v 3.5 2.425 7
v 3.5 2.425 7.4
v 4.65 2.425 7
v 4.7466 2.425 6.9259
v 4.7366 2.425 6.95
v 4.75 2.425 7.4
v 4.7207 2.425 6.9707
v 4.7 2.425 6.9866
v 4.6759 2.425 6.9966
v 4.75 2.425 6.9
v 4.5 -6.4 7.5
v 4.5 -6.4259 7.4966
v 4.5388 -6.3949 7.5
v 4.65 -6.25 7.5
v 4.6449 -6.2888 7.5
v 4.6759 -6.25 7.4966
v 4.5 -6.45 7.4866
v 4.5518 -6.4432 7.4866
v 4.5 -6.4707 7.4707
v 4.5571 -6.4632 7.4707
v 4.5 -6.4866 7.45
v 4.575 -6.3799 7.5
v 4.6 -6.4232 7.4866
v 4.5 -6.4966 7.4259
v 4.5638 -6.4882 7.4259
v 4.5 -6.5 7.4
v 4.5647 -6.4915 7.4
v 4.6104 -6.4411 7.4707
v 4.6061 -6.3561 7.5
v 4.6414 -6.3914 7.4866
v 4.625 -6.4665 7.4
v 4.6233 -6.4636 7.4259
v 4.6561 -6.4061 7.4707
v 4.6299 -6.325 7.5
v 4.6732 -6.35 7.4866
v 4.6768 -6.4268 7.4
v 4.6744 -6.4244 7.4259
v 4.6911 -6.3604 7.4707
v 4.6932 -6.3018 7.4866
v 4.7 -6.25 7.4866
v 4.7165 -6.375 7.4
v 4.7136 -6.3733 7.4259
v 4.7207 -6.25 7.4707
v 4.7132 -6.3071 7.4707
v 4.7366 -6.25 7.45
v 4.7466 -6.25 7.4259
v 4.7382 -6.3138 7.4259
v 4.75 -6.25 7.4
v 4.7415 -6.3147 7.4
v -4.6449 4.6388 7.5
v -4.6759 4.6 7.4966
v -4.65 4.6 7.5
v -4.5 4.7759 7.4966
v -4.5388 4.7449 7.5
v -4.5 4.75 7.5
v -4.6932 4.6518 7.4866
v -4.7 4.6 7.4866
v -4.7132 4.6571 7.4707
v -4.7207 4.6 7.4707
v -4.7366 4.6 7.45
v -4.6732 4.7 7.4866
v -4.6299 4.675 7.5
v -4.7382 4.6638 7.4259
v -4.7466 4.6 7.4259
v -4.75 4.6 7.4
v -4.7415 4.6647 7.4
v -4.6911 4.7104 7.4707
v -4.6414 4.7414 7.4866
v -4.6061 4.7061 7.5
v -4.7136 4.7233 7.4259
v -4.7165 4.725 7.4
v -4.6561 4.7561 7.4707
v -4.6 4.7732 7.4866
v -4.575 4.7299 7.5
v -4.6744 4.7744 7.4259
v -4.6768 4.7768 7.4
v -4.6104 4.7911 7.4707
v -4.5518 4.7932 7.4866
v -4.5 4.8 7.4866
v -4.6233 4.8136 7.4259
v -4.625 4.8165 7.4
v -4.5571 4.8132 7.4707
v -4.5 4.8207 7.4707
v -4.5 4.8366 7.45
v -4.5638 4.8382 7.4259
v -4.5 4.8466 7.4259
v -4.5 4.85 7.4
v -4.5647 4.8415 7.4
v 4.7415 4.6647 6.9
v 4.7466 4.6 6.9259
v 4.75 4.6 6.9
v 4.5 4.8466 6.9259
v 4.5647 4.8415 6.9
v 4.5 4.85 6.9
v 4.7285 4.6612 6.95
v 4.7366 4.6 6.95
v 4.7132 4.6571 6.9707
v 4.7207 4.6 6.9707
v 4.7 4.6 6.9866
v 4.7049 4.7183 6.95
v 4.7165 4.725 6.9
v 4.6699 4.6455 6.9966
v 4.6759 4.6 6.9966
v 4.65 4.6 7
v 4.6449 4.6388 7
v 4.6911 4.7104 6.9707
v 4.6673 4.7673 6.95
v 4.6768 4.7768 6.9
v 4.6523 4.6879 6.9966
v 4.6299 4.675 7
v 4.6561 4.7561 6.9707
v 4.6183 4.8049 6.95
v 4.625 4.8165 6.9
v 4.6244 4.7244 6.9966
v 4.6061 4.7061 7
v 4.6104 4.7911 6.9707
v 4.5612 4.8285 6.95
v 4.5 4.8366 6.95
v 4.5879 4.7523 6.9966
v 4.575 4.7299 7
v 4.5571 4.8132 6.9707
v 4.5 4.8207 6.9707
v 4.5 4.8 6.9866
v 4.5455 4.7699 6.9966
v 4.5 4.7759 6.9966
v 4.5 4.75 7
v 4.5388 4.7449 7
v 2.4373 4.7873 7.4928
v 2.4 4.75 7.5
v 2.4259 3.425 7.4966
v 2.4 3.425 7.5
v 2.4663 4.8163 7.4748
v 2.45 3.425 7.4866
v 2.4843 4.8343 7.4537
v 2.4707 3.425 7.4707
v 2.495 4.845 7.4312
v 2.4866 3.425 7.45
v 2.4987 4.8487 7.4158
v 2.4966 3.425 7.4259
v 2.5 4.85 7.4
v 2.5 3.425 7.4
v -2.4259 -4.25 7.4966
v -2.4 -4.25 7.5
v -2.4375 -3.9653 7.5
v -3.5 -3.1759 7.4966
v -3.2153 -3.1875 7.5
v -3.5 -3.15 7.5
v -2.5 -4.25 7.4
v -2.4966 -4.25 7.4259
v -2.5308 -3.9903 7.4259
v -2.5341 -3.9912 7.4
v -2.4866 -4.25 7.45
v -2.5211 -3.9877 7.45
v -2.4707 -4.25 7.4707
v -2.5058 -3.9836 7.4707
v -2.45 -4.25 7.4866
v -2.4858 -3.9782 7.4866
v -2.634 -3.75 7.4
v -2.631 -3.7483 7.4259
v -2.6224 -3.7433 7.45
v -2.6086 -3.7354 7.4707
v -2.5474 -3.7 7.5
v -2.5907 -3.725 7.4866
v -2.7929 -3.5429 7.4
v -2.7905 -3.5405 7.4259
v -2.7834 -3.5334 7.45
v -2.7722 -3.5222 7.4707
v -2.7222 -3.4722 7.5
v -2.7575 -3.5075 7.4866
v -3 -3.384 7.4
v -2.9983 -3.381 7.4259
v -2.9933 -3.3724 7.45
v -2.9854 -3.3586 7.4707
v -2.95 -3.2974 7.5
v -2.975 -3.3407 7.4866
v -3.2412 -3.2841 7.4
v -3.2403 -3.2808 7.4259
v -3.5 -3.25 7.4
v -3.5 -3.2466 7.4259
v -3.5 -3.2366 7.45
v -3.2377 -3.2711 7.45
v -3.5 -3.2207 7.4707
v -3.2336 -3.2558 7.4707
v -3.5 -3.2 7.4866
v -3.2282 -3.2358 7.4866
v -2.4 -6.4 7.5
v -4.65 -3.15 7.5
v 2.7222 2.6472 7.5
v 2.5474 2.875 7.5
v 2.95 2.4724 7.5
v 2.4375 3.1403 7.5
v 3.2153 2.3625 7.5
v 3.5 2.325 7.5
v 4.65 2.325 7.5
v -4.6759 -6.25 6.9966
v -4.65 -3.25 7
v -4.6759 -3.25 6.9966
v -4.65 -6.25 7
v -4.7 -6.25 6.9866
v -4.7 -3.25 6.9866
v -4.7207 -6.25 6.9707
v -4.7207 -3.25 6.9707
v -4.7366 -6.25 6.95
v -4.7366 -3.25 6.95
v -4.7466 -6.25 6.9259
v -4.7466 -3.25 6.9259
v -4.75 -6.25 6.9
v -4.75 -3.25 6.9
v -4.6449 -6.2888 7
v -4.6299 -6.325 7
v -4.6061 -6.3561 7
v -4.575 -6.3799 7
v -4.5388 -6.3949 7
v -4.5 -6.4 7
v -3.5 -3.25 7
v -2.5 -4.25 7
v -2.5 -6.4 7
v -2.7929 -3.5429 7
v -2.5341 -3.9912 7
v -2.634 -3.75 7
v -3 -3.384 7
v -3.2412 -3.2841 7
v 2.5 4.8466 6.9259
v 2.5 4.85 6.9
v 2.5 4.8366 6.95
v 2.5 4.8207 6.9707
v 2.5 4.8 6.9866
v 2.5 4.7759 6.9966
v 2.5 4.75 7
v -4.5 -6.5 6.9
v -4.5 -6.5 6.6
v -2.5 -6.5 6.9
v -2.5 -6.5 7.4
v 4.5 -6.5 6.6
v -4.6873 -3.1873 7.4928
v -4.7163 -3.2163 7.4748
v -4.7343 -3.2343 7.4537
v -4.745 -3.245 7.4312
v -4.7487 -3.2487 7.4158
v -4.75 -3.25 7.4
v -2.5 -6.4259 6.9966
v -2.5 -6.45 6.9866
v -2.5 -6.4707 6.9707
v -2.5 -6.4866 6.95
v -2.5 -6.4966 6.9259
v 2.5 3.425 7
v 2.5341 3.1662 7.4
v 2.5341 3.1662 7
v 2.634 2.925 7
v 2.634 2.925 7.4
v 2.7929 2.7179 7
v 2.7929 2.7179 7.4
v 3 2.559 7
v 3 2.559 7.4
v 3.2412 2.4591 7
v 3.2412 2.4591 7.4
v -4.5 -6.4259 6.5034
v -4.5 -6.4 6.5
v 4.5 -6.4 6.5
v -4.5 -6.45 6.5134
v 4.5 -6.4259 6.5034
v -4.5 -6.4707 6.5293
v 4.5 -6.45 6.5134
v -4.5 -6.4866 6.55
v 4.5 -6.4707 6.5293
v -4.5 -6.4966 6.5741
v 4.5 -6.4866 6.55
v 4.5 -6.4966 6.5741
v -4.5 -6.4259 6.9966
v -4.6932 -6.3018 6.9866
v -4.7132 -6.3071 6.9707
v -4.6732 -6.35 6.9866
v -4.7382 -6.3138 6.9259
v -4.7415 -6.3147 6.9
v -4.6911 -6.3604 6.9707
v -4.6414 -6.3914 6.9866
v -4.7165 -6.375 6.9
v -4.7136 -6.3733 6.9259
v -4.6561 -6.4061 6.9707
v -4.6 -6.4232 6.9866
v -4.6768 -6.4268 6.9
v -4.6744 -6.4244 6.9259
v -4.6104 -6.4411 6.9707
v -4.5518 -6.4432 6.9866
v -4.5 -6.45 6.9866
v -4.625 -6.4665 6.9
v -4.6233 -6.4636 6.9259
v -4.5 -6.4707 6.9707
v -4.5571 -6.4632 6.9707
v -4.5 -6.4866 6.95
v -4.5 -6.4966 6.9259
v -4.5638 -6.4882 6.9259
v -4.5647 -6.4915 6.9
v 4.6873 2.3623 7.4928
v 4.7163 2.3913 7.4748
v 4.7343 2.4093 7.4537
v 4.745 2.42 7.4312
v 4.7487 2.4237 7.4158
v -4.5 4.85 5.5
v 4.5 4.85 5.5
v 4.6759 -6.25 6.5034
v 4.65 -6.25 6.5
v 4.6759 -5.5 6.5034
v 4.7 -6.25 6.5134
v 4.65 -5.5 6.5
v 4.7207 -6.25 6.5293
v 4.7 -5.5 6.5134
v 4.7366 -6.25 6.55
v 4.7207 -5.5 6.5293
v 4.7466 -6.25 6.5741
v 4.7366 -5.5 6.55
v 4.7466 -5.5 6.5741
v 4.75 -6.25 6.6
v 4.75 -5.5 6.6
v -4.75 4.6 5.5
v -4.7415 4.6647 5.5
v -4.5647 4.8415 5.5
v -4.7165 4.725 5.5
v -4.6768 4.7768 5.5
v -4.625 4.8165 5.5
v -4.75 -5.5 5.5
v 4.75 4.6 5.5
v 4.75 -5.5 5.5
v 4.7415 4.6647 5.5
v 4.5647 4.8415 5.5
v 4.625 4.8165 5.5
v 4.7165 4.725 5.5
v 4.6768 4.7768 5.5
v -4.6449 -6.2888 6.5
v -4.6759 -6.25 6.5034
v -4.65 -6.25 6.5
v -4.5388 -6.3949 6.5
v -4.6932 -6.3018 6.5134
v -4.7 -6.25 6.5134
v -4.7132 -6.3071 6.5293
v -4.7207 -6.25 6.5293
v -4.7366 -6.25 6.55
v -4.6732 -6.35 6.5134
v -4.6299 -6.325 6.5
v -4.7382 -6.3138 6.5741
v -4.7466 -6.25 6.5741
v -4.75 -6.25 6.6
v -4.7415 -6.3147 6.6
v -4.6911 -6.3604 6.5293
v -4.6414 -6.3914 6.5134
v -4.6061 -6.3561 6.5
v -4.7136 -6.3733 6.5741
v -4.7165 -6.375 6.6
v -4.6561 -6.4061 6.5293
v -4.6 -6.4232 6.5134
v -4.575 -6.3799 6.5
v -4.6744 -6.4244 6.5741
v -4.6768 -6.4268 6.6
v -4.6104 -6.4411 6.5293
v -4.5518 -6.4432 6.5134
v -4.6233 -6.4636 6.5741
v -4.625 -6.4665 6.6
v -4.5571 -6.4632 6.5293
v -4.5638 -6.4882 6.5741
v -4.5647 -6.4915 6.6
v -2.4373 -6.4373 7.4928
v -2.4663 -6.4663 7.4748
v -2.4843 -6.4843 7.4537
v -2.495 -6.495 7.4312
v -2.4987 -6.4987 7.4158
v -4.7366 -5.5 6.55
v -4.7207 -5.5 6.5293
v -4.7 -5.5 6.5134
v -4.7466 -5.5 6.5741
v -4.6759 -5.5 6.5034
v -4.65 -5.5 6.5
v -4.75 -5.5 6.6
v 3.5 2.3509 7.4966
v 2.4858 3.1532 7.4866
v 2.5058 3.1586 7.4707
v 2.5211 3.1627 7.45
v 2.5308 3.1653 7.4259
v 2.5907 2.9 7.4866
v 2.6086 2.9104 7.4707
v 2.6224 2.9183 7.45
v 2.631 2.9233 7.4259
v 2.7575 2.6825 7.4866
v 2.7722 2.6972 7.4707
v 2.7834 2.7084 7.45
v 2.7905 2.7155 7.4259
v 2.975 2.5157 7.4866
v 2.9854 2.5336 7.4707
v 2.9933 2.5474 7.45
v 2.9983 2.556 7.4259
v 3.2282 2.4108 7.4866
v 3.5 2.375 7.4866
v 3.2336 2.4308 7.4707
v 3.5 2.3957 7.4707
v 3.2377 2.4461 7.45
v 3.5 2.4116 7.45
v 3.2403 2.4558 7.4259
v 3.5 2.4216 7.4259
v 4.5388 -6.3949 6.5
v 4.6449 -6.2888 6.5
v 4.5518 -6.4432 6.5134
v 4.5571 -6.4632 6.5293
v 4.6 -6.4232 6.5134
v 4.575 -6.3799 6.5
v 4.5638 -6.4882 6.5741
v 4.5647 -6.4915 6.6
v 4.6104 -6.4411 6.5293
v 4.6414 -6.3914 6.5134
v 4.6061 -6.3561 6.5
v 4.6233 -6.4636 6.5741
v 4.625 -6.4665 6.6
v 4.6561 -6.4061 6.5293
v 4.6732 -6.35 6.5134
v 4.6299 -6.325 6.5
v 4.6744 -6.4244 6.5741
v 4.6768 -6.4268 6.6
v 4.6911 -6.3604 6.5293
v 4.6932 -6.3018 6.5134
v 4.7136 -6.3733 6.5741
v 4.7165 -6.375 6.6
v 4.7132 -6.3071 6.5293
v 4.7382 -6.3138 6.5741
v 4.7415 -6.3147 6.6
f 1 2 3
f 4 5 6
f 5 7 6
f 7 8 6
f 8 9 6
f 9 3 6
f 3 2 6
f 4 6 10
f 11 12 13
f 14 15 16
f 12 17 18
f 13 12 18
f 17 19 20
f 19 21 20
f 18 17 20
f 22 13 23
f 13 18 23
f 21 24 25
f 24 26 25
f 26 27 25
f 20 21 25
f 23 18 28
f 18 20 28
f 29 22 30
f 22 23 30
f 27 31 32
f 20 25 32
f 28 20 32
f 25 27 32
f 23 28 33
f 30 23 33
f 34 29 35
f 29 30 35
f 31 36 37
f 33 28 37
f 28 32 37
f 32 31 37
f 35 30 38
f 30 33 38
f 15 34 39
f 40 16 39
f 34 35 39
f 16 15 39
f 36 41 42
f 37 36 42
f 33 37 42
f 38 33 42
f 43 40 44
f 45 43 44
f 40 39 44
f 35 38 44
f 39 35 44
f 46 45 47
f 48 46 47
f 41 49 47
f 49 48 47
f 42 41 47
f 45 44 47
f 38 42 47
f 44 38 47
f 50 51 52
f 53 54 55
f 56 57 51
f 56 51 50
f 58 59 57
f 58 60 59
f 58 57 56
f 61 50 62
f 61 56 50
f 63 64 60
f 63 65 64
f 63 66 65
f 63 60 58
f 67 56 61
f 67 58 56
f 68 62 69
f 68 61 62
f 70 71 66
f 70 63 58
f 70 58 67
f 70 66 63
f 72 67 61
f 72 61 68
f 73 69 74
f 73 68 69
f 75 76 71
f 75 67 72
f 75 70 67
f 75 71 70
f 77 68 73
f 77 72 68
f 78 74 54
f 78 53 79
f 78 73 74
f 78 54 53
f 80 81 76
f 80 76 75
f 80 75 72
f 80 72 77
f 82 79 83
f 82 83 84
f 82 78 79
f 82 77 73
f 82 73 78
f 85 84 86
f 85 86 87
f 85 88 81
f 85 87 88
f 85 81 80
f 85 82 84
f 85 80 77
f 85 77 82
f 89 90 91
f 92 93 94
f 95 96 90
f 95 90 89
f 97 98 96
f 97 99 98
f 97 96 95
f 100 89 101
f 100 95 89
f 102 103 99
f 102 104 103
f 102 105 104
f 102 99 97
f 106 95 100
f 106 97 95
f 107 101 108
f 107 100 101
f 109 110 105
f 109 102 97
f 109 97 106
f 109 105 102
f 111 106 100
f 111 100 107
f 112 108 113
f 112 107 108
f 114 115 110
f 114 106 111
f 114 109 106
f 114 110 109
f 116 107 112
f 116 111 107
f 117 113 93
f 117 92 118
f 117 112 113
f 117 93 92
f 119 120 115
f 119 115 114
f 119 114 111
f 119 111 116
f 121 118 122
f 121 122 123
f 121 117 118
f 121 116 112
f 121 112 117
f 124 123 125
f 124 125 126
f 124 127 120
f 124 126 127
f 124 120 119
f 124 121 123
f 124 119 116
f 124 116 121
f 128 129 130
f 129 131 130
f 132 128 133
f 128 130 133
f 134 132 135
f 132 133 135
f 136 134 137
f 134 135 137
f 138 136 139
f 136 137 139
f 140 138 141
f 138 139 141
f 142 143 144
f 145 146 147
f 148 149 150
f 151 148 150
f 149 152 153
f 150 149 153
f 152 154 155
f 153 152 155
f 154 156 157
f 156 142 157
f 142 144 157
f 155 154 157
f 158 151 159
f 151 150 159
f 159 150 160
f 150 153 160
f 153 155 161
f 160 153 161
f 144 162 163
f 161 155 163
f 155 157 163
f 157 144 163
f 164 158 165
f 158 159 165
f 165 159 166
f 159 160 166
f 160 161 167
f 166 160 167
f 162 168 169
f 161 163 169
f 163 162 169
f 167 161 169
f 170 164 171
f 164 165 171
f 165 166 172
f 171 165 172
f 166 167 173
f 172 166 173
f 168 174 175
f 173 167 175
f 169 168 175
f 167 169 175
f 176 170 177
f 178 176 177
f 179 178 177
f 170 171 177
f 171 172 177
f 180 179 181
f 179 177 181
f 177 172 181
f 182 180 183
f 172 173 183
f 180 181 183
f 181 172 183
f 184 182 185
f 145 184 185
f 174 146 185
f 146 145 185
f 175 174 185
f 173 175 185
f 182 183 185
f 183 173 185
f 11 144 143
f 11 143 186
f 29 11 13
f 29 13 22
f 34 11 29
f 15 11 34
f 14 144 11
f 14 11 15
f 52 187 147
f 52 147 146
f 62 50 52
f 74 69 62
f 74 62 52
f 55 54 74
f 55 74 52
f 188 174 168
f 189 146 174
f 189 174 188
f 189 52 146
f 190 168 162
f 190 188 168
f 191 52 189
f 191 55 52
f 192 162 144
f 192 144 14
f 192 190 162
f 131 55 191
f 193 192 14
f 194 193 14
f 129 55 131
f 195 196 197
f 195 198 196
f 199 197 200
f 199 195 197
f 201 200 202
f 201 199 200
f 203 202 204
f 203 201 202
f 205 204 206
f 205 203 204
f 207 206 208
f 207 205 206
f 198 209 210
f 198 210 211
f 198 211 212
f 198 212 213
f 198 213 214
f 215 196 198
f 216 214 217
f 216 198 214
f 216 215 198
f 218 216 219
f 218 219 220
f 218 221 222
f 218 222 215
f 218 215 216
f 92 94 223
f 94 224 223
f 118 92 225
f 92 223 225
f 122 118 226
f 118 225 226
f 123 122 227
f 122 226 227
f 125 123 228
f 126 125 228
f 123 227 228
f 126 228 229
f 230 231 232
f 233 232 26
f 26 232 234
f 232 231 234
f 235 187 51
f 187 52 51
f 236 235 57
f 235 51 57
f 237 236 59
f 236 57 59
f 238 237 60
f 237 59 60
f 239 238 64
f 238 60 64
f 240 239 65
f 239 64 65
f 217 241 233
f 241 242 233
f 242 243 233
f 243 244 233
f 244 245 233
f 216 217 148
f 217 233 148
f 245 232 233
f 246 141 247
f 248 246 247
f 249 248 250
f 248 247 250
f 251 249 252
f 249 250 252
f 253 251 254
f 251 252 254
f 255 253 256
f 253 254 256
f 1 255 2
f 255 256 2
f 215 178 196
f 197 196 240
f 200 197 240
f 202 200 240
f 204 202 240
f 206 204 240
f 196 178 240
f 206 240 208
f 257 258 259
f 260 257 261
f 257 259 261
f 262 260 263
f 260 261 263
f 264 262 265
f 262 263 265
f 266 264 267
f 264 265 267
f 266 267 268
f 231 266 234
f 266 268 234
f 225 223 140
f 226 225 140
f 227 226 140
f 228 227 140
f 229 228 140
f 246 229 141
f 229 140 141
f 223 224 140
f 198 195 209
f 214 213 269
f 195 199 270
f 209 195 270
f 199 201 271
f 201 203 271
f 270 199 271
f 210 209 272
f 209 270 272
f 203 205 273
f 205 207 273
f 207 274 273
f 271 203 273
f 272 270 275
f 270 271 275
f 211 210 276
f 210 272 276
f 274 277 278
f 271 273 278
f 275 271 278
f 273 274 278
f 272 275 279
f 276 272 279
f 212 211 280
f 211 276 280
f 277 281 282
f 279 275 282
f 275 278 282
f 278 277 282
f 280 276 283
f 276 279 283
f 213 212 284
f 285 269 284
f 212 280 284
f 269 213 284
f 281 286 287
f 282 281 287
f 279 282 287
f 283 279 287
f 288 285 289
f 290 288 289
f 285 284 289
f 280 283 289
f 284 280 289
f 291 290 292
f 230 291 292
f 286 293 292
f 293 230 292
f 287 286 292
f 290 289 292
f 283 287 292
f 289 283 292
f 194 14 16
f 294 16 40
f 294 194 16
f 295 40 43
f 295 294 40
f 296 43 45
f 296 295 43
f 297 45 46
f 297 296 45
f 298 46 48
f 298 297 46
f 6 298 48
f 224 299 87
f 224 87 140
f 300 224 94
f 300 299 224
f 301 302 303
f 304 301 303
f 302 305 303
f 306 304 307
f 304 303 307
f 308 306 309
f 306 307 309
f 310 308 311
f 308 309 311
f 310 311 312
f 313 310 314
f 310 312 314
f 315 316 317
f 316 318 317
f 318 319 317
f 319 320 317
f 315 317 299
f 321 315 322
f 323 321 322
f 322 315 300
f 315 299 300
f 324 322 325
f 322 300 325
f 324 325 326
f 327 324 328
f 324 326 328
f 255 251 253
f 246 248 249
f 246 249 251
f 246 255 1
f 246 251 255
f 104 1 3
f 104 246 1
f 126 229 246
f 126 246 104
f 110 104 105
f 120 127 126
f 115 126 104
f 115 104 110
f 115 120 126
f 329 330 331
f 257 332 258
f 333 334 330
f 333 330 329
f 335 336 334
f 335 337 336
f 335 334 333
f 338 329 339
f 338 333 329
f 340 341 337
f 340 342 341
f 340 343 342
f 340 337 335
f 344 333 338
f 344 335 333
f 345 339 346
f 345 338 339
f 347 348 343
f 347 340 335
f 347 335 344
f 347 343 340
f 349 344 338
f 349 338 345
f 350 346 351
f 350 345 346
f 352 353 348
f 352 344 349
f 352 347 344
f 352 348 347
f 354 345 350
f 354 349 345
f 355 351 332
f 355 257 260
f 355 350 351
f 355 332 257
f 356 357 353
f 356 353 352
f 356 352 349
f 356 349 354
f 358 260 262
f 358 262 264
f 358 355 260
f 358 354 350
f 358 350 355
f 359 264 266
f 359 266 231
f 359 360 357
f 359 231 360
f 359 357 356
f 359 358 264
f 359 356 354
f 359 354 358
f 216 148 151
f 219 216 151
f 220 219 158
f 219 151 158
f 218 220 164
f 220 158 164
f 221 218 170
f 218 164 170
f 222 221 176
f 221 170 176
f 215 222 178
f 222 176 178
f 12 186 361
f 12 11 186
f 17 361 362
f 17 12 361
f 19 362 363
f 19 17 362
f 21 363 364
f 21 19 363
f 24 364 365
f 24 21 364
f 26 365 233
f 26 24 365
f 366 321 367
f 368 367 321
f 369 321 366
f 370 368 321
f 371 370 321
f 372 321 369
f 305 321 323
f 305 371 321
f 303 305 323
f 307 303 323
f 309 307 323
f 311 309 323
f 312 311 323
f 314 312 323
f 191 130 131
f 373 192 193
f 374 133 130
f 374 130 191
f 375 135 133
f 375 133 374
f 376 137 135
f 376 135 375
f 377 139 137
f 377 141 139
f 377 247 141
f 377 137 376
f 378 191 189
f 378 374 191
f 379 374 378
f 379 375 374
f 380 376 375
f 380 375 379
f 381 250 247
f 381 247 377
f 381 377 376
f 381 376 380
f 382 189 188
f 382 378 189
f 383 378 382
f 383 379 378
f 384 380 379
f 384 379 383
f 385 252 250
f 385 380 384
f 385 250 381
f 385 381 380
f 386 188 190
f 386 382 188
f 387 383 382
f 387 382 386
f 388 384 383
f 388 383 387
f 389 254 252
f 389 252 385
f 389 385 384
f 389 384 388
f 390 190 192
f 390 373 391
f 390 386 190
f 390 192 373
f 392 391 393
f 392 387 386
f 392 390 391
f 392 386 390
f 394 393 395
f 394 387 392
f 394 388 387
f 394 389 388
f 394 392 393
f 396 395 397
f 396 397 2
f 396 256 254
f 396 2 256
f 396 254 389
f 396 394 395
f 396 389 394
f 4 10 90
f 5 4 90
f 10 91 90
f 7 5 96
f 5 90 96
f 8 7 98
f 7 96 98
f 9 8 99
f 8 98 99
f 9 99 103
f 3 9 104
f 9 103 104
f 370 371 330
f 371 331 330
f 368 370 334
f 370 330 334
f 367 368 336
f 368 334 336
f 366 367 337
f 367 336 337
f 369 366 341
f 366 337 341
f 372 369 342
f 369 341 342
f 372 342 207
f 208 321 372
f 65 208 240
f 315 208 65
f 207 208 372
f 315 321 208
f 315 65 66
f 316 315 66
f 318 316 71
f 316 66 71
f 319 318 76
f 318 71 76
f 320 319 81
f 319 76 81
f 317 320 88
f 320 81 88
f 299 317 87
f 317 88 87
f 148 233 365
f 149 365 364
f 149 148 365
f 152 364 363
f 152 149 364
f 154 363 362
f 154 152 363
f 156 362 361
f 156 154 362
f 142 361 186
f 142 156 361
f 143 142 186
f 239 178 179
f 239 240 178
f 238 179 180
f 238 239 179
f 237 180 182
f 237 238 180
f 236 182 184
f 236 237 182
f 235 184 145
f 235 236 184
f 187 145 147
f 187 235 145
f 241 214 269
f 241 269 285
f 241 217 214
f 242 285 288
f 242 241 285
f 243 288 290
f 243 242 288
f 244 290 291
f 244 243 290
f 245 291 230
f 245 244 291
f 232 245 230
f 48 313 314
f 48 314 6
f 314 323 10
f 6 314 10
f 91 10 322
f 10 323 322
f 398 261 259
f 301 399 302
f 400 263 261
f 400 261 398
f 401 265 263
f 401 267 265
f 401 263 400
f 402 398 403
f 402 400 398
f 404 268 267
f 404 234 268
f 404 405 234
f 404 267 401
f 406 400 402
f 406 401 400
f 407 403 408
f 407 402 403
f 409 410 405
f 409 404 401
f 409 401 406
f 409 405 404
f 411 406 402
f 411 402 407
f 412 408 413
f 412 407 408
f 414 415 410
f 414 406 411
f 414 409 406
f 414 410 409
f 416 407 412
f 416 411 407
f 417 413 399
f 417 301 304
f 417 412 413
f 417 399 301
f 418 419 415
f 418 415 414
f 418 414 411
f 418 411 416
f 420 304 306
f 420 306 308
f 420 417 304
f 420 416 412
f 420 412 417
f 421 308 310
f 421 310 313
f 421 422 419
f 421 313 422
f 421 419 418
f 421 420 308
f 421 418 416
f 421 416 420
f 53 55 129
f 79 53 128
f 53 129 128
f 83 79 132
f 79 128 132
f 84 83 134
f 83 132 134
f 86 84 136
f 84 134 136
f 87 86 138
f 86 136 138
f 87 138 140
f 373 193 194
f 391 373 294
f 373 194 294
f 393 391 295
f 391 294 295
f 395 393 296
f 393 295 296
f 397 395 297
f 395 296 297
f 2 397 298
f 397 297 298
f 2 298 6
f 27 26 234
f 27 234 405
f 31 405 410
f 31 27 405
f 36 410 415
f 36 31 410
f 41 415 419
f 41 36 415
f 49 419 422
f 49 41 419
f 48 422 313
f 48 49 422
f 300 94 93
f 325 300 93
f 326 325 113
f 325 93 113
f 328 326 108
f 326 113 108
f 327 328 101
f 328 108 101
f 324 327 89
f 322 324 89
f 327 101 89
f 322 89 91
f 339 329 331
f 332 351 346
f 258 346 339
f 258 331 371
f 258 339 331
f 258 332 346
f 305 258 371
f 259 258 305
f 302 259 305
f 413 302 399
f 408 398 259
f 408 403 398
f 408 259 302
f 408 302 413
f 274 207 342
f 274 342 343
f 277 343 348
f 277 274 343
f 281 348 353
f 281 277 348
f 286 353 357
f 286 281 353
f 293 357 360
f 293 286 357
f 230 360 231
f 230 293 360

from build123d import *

# Parameters (mm, degrees)
SKETCH005_W     = 9.5
SKETCH005_H     = 11.35
PAD002_DEPTH    = 2
SKETCH006_W     = 9.5
SKETCH006_H     = 1
POCKET_DEPTH    = 1
POCKET002_DEPTH = 0.5
FILLET008_R     = 0.25
FILLET009_R     = 0.1


with BuildPart() as part:
    # Sketch005 → Pad002 (new body)
    with BuildSketch(Plane.XY.offset(5.5)):
        with Locations((0, -0.825)):
            Rectangle(SKETCH005_W, SKETCH005_H)
    extrude(amount=PAD002_DEPTH)

    # Sketch006 → Pocket (cut)
    with BuildSketch(Plane(origin=(0, -6.5, 5.5), x_dir=(1, 0, 0), z_dir=(0, -1, 0))):
        with Locations((0, 0.5)):
            Rectangle(SKETCH006_W, SKETCH006_H)
    extrude(amount=-POCKET_DEPTH, mode=Mode.SUBTRACT)

    # Sketch008 → Pocket002 (cut)
    with BuildSketch(Plane.XY.offset(7.5)):
        with BuildLine():
            Line((4.75, 4.85), (2.5, 4.85))
            Line((2.5, 4.85), (2.5, 3.425))
            ThreePointArc((2.5, 3.425), (2.792893, 2.717893), (3.5, 2.425))
            Line((3.5, 2.425), (4.75, 2.425))
            Line((4.75, 2.425), (4.75, 4.85))
        make_face()
        with BuildLine():
            Line((-4.75, -6.5), (-2.5, -6.5))
            Line((-2.5, -6.5), (-2.5, -4.25))
            ThreePointArc((-2.5, -4.25), (-2.792893, -3.542893), (-3.5, -3.25))
            Line((-3.5, -3.25), (-4.75, -3.25))
            Line((-4.75, -3.25), (-4.75, -6.5))
        make_face()
    extrude(amount=-POCKET002_DEPTH, mode=Mode.SUBTRACT)

    # Fillet008
    fillet008_edges = [part.edges().sort_by_distance(p)[0] for p in [
        (-4.75, -6.5, 6.75),
        (4.75, -6.5, 7),
        (-4.75, 4.85, 6.5),
        (4.75, 4.85, 6.25),
    ]]
    fillet(fillet008_edges, radius=FILLET008_R)

    # Fillet009
    fillet009_edges = [part.edges().sort_by_distance(p)[0] for p in [
        (4.75, -1.9125, 7.5),
        (4.125, 2.425, 7.5),
        (2.5, 4.1375, 7.5),
        (-1, 4.85, 7.5),
        (-4.75, 0.675, 7.5),
        (-4.125, -3.25, 7.5),
        (-2.5, -5.375, 7.5),
        (1, -6.5, 7.5),
        (0, -6.5, 6.5),
        (-3.5, -6.5, 7),
        (-4.75, -4.75, 7),
        (3.5, 4.85, 7),
        (4.75, 3.5125, 7),
    ]]
    fillet(fillet009_edges, radius=FILLET009_R)


solid = part.part
